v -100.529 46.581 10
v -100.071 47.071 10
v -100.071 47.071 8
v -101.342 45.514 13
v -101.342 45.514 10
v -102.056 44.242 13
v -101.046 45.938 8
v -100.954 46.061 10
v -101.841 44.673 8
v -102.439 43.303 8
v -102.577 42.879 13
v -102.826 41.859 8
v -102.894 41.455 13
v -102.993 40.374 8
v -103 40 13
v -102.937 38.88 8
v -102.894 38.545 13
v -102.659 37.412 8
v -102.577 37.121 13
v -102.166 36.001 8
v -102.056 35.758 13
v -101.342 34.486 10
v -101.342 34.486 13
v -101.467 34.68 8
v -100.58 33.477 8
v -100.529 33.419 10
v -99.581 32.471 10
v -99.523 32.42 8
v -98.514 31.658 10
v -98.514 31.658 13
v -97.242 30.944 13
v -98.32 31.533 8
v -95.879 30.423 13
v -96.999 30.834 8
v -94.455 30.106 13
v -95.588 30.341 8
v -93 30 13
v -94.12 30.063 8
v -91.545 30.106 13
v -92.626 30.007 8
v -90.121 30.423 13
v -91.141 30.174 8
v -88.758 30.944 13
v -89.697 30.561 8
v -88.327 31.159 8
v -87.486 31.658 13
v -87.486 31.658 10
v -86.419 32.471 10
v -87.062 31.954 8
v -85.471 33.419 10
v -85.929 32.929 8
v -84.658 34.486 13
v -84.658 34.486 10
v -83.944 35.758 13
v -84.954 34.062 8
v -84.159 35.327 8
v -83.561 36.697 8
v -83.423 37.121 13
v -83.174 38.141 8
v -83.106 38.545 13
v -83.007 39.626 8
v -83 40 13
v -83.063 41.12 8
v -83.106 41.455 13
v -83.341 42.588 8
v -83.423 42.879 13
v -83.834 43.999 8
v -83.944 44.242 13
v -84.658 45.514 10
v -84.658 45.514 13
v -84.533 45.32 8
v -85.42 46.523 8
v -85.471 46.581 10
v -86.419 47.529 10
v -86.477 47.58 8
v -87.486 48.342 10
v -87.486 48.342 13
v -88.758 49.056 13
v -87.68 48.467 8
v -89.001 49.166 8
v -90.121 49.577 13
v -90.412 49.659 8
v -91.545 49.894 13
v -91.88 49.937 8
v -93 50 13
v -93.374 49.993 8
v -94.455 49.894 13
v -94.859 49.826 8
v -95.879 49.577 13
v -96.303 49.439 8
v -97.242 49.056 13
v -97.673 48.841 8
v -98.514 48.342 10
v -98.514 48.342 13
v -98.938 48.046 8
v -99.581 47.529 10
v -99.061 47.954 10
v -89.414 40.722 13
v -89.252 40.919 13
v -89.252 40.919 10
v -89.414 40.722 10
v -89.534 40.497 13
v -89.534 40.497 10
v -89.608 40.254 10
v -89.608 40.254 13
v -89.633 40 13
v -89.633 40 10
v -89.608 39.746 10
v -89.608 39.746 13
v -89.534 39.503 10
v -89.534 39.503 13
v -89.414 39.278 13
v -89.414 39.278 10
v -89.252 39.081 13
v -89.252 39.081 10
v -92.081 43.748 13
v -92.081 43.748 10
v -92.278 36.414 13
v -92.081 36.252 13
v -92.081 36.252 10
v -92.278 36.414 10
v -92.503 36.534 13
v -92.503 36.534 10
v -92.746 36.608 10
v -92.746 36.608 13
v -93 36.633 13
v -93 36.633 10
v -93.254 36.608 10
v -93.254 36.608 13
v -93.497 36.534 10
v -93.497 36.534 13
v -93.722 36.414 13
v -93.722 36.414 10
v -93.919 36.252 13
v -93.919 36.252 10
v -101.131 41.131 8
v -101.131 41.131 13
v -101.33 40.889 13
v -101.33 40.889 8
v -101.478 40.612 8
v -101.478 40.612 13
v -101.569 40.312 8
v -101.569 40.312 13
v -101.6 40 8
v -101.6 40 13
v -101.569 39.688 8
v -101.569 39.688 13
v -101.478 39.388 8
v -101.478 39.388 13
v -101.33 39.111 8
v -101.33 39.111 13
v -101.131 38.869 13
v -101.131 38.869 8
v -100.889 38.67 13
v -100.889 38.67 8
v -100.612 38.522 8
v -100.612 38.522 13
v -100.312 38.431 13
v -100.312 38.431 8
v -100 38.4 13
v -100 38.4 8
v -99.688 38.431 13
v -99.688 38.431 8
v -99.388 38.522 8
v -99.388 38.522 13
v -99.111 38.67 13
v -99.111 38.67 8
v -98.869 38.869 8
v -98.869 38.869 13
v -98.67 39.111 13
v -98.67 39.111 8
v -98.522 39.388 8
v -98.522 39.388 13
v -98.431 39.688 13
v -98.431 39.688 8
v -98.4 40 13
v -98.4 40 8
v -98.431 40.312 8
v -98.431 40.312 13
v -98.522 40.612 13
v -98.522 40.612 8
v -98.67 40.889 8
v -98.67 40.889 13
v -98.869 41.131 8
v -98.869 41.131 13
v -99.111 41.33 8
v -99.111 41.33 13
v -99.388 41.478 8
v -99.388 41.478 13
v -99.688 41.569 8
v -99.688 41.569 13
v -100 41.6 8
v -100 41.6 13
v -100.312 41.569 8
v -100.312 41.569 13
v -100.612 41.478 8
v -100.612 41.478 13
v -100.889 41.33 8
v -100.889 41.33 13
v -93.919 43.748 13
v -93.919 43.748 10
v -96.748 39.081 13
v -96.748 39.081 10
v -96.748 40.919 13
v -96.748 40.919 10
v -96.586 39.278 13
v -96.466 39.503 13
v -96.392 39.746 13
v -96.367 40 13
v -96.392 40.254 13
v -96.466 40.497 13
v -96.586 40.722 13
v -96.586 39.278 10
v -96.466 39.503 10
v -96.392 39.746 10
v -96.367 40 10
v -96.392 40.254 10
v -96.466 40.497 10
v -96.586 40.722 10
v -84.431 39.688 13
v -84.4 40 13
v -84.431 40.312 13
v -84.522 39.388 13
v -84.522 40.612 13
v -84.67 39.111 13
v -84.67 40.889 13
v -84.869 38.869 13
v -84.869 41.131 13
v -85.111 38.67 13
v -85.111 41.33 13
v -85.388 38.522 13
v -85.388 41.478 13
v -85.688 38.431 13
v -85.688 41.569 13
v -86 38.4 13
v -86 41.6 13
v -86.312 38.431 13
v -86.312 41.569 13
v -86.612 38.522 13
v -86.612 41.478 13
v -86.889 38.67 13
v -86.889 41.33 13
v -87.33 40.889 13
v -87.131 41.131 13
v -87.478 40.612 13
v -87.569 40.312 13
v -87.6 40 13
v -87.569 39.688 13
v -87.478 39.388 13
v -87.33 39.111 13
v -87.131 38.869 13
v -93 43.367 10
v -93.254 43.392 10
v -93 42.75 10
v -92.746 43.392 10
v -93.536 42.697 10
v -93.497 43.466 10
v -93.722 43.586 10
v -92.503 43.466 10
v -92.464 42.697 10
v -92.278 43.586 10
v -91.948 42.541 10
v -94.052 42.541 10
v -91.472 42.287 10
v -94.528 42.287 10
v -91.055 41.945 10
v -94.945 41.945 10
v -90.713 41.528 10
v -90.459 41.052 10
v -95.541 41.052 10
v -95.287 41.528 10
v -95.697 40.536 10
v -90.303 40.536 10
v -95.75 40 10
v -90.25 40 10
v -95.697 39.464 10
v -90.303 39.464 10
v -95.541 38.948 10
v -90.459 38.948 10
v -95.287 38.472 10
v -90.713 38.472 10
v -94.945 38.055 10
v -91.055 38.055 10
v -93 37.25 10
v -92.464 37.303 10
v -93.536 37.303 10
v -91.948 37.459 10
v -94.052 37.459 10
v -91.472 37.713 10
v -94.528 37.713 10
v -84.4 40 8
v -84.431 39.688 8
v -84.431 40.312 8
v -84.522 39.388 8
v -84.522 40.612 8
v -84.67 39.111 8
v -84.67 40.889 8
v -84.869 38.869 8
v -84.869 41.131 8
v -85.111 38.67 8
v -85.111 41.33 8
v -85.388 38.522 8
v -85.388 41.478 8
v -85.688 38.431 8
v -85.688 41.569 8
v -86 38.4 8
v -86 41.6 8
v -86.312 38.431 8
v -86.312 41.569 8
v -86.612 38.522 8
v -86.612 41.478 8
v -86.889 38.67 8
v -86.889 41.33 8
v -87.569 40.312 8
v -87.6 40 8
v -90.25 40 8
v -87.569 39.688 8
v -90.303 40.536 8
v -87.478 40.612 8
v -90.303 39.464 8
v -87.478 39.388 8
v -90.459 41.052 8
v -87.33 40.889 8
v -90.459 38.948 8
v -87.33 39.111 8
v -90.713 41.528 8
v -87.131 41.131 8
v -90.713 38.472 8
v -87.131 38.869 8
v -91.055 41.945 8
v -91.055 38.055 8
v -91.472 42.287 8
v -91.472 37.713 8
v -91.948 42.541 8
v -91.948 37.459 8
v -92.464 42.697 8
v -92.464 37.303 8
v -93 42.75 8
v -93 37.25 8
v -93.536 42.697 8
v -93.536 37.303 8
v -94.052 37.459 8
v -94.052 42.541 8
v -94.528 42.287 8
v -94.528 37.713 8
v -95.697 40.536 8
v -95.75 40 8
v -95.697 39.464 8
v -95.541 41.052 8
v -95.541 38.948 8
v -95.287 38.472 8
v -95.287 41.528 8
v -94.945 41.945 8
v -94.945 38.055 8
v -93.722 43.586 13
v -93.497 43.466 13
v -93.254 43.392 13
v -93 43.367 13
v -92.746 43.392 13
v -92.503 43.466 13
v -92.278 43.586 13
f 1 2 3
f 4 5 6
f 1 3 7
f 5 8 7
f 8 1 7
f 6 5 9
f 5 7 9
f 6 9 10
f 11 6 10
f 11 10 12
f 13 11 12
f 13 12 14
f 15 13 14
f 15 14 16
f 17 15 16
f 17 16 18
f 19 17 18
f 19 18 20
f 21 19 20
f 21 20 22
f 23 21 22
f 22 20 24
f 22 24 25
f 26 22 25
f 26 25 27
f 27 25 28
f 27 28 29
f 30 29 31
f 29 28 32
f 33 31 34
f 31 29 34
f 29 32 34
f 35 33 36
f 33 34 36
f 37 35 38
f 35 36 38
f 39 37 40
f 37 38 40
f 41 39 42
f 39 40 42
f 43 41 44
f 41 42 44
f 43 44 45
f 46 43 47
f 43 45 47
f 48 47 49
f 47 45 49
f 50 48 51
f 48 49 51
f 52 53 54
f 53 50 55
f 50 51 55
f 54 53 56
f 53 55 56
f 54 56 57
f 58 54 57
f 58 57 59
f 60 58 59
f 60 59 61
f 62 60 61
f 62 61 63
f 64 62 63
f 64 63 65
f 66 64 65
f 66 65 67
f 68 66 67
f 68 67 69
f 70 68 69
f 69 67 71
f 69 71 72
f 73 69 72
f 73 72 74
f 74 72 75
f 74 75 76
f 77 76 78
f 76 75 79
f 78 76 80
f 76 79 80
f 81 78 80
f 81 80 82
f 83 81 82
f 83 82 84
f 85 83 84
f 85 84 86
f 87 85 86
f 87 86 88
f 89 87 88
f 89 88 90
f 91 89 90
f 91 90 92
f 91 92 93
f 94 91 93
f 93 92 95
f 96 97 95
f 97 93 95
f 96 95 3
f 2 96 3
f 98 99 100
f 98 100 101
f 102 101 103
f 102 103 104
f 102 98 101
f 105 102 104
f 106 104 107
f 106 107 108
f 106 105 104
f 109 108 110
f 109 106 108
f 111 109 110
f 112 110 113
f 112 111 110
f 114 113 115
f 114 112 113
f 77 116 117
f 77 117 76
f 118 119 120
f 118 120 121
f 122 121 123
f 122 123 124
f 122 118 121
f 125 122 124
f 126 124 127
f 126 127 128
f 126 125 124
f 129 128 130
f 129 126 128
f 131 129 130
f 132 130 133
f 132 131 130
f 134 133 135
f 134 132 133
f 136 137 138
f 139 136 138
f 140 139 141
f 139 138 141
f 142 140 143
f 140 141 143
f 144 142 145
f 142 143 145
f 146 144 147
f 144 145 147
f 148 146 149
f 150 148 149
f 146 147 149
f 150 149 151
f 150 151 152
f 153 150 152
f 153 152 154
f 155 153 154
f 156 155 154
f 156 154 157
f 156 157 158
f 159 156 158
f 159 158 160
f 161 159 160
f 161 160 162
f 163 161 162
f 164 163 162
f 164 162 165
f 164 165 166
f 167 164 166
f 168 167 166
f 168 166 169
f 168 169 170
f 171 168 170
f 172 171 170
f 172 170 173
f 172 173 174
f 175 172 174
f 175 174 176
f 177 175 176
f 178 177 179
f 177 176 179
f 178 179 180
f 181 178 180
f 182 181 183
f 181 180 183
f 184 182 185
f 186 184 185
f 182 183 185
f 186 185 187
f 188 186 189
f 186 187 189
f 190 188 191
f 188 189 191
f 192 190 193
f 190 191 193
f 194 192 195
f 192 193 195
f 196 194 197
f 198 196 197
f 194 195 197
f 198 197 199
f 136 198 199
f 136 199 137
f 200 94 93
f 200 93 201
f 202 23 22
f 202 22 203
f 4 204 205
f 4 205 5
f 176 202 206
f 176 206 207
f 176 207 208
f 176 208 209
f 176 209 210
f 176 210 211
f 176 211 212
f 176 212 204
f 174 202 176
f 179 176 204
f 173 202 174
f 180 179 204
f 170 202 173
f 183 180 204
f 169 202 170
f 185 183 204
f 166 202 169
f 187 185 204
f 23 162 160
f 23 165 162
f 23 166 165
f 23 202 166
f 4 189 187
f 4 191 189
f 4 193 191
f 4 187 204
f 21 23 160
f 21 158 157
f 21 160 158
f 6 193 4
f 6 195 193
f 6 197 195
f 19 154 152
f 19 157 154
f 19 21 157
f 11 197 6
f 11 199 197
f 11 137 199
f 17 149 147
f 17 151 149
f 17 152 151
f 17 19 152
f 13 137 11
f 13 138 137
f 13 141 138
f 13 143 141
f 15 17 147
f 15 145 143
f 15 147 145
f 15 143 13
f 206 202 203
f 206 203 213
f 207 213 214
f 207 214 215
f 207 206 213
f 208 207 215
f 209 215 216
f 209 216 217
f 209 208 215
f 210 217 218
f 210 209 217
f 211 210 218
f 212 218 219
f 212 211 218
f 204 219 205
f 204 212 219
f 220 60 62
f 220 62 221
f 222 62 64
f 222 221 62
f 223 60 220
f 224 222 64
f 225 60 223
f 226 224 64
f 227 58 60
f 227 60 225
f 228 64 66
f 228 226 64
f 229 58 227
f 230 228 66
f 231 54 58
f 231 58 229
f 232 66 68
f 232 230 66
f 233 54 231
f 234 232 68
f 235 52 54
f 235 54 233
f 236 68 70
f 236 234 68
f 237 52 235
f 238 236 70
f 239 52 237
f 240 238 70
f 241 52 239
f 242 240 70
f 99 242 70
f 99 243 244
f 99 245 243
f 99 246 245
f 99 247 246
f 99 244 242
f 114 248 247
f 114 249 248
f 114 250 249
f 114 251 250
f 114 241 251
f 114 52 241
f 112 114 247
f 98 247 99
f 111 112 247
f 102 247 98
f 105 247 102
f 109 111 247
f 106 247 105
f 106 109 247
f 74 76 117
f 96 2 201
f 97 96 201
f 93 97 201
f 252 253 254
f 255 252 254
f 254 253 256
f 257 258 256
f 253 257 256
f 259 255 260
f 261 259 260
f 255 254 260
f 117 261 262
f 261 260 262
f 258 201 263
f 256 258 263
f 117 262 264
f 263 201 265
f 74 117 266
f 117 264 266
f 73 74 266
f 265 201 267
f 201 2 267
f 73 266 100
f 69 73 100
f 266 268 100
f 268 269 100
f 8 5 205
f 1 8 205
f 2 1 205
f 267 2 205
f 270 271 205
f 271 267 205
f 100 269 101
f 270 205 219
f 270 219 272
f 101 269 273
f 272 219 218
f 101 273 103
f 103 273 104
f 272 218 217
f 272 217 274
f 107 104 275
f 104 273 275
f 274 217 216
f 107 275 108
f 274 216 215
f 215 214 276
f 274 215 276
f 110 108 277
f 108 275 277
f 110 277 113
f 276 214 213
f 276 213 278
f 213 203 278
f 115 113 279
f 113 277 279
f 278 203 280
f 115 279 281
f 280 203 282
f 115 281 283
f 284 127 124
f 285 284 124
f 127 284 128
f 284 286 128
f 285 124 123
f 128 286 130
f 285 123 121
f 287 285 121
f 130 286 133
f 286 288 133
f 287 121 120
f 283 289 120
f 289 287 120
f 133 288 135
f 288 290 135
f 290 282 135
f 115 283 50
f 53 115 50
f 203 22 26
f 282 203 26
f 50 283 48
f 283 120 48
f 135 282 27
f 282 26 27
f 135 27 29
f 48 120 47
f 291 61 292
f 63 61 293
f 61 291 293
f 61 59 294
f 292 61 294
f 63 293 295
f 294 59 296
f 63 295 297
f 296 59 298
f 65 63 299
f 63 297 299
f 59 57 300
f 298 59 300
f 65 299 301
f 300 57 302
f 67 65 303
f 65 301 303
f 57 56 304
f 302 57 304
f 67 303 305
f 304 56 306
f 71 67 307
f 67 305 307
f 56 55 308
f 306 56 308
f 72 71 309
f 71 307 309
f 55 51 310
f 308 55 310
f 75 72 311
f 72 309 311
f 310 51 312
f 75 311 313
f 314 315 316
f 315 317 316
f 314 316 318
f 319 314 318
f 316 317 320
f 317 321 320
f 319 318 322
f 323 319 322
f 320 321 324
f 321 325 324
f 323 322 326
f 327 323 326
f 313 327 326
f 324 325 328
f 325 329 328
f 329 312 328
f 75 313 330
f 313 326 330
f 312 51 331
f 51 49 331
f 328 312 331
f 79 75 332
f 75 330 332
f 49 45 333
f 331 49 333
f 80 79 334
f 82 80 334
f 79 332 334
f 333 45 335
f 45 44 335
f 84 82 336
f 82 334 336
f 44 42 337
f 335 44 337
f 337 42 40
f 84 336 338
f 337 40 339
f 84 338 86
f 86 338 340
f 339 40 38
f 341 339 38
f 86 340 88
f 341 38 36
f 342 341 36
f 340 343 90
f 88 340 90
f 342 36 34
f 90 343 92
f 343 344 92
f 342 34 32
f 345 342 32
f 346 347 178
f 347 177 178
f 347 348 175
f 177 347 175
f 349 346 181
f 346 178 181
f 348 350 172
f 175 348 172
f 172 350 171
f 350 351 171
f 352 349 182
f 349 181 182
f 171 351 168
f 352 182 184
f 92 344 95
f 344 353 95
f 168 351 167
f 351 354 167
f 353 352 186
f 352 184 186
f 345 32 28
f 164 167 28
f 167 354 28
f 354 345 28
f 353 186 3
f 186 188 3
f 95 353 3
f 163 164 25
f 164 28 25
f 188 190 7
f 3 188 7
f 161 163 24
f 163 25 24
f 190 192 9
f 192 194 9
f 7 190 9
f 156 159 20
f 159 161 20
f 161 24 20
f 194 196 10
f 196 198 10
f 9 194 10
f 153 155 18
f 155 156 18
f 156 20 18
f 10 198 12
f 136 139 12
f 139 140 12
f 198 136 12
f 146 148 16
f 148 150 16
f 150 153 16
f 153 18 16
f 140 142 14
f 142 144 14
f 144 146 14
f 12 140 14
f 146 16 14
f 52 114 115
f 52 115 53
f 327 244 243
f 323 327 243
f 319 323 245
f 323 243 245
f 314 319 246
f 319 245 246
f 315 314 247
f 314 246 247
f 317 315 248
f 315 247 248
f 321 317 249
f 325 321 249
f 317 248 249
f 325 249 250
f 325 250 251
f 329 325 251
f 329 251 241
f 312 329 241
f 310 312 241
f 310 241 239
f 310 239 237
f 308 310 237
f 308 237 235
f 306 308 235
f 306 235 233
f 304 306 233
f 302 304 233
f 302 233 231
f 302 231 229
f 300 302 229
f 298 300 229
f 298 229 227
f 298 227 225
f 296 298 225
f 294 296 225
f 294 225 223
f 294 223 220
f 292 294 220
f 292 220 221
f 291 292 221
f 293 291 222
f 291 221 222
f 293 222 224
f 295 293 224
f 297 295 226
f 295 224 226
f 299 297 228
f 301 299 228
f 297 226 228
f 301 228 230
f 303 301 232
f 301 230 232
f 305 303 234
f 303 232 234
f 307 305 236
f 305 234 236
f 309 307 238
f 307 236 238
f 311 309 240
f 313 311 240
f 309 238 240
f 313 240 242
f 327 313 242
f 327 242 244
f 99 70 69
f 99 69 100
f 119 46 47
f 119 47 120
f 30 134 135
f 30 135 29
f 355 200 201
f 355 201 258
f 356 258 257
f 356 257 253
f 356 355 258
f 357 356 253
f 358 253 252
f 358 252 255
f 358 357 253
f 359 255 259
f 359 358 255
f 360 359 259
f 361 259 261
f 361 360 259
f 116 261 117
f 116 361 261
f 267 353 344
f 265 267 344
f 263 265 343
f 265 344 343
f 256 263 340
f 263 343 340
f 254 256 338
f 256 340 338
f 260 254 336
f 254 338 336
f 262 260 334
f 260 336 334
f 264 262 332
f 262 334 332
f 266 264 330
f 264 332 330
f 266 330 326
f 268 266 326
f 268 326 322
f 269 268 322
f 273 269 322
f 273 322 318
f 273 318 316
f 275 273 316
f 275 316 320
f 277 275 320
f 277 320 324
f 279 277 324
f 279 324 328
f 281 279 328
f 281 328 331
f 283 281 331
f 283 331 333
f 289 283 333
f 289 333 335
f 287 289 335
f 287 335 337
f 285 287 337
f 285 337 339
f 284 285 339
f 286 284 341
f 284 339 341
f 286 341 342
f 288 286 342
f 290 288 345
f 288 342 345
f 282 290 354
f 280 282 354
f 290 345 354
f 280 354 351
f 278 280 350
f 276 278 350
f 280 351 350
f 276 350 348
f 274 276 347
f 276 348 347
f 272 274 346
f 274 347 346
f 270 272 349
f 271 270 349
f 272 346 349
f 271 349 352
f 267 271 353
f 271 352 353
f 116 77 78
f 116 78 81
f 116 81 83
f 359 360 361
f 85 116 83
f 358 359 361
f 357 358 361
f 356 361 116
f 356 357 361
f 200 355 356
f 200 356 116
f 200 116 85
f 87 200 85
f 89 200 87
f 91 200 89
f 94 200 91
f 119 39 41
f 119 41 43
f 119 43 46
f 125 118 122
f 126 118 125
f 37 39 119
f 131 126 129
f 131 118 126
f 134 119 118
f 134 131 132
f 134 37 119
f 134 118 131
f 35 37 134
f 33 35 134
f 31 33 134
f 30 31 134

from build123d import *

# Parameters (mm, degrees)
SKETCH042_R             = 10
PAD013_DEPTH            = 5
POCKET026_DEPTH         = 3
SKETCH044_R             = 2.75
POCKET027_DEPTH         = 5.001
SKETCH045_R             = 1.6
POCKET028_DEPTH         = 5.001
BODY008_PLACEMENT_ANGLE = 135


with BuildPart() as part:
    # Sketch042 → Pad013 (new body)
    with BuildSketch(Plane.XY):
        Circle(SKETCH042_R)
    extrude(amount=PAD013_DEPTH)

    # Sketch043 (on Face3 of Pad013) → Pocket026 (cut)
    with BuildSketch(Plane.XY.offset(5)):
        with BuildLine():
            Line((-2, 10), (2, 10))
            Line((2, 10), (2, 3.3))
            ThreePointArc((2, 3.3), (2.380761, 2.380761), (3.3, 2))
            Line((3.3, 2), (10, 2))
            Line((10, 2), (10, -2))
            Line((10, -2), (3.3, -2))
            ThreePointArc((3.3, -2), (2.380761, -2.380761), (2, -3.3))
            Line((2, -3.3), (2, -10))
            Line((2, -10), (-2, -10))
            Line((-2, -10), (-2, -3.3))
            ThreePointArc((-2, -3.3), (-2.380761, -2.380761), (-3.3, -2))
            Line((-3.3, -2), (-10, -2))
            Line((-10, -2), (-10, 2))
            Line((-10, 2), (-3.3, 2))
            ThreePointArc((-3.3, 2), (-2.380761, 2.380761), (-2, 3.3))
            Line((-2, 3.3), (-2, 10))
        make_face()
    extrude(amount=-POCKET026_DEPTH, mode=Mode.SUBTRACT)

    # Sketch044 (on Face2 of Pocket026) → Pocket027 (cut, through all)
    with BuildSketch(Plane(origin=(0, 0, 0), x_dir=(1, 0, 0), z_dir=(0, 0, -1))):
        Circle(SKETCH044_R)
    extrude(amount=-POCKET027_DEPTH, mode=Mode.SUBTRACT)

    # Sketch045 (on Face8 of Pocket027) → Pocket028 (cut, through all)
    with BuildSketch(Plane.XY.offset(5)):
        with Locations((4.949747, 4.949747)):
            Circle(SKETCH045_R)
        with Locations((-4.949747, -4.949747)):
            Circle(SKETCH045_R)
    extrude(amount=-POCKET028_DEPTH, mode=Mode.SUBTRACT)


with BuildPart() as part_1:
    # Body008 placement: moved
    add(part.part.moved(Location((-93, 40, 8))).rotate(Axis((-93, 40, 8), (0, 0, 1)), BODY008_PLACEMENT_ANGLE))


solid = part_1.part
